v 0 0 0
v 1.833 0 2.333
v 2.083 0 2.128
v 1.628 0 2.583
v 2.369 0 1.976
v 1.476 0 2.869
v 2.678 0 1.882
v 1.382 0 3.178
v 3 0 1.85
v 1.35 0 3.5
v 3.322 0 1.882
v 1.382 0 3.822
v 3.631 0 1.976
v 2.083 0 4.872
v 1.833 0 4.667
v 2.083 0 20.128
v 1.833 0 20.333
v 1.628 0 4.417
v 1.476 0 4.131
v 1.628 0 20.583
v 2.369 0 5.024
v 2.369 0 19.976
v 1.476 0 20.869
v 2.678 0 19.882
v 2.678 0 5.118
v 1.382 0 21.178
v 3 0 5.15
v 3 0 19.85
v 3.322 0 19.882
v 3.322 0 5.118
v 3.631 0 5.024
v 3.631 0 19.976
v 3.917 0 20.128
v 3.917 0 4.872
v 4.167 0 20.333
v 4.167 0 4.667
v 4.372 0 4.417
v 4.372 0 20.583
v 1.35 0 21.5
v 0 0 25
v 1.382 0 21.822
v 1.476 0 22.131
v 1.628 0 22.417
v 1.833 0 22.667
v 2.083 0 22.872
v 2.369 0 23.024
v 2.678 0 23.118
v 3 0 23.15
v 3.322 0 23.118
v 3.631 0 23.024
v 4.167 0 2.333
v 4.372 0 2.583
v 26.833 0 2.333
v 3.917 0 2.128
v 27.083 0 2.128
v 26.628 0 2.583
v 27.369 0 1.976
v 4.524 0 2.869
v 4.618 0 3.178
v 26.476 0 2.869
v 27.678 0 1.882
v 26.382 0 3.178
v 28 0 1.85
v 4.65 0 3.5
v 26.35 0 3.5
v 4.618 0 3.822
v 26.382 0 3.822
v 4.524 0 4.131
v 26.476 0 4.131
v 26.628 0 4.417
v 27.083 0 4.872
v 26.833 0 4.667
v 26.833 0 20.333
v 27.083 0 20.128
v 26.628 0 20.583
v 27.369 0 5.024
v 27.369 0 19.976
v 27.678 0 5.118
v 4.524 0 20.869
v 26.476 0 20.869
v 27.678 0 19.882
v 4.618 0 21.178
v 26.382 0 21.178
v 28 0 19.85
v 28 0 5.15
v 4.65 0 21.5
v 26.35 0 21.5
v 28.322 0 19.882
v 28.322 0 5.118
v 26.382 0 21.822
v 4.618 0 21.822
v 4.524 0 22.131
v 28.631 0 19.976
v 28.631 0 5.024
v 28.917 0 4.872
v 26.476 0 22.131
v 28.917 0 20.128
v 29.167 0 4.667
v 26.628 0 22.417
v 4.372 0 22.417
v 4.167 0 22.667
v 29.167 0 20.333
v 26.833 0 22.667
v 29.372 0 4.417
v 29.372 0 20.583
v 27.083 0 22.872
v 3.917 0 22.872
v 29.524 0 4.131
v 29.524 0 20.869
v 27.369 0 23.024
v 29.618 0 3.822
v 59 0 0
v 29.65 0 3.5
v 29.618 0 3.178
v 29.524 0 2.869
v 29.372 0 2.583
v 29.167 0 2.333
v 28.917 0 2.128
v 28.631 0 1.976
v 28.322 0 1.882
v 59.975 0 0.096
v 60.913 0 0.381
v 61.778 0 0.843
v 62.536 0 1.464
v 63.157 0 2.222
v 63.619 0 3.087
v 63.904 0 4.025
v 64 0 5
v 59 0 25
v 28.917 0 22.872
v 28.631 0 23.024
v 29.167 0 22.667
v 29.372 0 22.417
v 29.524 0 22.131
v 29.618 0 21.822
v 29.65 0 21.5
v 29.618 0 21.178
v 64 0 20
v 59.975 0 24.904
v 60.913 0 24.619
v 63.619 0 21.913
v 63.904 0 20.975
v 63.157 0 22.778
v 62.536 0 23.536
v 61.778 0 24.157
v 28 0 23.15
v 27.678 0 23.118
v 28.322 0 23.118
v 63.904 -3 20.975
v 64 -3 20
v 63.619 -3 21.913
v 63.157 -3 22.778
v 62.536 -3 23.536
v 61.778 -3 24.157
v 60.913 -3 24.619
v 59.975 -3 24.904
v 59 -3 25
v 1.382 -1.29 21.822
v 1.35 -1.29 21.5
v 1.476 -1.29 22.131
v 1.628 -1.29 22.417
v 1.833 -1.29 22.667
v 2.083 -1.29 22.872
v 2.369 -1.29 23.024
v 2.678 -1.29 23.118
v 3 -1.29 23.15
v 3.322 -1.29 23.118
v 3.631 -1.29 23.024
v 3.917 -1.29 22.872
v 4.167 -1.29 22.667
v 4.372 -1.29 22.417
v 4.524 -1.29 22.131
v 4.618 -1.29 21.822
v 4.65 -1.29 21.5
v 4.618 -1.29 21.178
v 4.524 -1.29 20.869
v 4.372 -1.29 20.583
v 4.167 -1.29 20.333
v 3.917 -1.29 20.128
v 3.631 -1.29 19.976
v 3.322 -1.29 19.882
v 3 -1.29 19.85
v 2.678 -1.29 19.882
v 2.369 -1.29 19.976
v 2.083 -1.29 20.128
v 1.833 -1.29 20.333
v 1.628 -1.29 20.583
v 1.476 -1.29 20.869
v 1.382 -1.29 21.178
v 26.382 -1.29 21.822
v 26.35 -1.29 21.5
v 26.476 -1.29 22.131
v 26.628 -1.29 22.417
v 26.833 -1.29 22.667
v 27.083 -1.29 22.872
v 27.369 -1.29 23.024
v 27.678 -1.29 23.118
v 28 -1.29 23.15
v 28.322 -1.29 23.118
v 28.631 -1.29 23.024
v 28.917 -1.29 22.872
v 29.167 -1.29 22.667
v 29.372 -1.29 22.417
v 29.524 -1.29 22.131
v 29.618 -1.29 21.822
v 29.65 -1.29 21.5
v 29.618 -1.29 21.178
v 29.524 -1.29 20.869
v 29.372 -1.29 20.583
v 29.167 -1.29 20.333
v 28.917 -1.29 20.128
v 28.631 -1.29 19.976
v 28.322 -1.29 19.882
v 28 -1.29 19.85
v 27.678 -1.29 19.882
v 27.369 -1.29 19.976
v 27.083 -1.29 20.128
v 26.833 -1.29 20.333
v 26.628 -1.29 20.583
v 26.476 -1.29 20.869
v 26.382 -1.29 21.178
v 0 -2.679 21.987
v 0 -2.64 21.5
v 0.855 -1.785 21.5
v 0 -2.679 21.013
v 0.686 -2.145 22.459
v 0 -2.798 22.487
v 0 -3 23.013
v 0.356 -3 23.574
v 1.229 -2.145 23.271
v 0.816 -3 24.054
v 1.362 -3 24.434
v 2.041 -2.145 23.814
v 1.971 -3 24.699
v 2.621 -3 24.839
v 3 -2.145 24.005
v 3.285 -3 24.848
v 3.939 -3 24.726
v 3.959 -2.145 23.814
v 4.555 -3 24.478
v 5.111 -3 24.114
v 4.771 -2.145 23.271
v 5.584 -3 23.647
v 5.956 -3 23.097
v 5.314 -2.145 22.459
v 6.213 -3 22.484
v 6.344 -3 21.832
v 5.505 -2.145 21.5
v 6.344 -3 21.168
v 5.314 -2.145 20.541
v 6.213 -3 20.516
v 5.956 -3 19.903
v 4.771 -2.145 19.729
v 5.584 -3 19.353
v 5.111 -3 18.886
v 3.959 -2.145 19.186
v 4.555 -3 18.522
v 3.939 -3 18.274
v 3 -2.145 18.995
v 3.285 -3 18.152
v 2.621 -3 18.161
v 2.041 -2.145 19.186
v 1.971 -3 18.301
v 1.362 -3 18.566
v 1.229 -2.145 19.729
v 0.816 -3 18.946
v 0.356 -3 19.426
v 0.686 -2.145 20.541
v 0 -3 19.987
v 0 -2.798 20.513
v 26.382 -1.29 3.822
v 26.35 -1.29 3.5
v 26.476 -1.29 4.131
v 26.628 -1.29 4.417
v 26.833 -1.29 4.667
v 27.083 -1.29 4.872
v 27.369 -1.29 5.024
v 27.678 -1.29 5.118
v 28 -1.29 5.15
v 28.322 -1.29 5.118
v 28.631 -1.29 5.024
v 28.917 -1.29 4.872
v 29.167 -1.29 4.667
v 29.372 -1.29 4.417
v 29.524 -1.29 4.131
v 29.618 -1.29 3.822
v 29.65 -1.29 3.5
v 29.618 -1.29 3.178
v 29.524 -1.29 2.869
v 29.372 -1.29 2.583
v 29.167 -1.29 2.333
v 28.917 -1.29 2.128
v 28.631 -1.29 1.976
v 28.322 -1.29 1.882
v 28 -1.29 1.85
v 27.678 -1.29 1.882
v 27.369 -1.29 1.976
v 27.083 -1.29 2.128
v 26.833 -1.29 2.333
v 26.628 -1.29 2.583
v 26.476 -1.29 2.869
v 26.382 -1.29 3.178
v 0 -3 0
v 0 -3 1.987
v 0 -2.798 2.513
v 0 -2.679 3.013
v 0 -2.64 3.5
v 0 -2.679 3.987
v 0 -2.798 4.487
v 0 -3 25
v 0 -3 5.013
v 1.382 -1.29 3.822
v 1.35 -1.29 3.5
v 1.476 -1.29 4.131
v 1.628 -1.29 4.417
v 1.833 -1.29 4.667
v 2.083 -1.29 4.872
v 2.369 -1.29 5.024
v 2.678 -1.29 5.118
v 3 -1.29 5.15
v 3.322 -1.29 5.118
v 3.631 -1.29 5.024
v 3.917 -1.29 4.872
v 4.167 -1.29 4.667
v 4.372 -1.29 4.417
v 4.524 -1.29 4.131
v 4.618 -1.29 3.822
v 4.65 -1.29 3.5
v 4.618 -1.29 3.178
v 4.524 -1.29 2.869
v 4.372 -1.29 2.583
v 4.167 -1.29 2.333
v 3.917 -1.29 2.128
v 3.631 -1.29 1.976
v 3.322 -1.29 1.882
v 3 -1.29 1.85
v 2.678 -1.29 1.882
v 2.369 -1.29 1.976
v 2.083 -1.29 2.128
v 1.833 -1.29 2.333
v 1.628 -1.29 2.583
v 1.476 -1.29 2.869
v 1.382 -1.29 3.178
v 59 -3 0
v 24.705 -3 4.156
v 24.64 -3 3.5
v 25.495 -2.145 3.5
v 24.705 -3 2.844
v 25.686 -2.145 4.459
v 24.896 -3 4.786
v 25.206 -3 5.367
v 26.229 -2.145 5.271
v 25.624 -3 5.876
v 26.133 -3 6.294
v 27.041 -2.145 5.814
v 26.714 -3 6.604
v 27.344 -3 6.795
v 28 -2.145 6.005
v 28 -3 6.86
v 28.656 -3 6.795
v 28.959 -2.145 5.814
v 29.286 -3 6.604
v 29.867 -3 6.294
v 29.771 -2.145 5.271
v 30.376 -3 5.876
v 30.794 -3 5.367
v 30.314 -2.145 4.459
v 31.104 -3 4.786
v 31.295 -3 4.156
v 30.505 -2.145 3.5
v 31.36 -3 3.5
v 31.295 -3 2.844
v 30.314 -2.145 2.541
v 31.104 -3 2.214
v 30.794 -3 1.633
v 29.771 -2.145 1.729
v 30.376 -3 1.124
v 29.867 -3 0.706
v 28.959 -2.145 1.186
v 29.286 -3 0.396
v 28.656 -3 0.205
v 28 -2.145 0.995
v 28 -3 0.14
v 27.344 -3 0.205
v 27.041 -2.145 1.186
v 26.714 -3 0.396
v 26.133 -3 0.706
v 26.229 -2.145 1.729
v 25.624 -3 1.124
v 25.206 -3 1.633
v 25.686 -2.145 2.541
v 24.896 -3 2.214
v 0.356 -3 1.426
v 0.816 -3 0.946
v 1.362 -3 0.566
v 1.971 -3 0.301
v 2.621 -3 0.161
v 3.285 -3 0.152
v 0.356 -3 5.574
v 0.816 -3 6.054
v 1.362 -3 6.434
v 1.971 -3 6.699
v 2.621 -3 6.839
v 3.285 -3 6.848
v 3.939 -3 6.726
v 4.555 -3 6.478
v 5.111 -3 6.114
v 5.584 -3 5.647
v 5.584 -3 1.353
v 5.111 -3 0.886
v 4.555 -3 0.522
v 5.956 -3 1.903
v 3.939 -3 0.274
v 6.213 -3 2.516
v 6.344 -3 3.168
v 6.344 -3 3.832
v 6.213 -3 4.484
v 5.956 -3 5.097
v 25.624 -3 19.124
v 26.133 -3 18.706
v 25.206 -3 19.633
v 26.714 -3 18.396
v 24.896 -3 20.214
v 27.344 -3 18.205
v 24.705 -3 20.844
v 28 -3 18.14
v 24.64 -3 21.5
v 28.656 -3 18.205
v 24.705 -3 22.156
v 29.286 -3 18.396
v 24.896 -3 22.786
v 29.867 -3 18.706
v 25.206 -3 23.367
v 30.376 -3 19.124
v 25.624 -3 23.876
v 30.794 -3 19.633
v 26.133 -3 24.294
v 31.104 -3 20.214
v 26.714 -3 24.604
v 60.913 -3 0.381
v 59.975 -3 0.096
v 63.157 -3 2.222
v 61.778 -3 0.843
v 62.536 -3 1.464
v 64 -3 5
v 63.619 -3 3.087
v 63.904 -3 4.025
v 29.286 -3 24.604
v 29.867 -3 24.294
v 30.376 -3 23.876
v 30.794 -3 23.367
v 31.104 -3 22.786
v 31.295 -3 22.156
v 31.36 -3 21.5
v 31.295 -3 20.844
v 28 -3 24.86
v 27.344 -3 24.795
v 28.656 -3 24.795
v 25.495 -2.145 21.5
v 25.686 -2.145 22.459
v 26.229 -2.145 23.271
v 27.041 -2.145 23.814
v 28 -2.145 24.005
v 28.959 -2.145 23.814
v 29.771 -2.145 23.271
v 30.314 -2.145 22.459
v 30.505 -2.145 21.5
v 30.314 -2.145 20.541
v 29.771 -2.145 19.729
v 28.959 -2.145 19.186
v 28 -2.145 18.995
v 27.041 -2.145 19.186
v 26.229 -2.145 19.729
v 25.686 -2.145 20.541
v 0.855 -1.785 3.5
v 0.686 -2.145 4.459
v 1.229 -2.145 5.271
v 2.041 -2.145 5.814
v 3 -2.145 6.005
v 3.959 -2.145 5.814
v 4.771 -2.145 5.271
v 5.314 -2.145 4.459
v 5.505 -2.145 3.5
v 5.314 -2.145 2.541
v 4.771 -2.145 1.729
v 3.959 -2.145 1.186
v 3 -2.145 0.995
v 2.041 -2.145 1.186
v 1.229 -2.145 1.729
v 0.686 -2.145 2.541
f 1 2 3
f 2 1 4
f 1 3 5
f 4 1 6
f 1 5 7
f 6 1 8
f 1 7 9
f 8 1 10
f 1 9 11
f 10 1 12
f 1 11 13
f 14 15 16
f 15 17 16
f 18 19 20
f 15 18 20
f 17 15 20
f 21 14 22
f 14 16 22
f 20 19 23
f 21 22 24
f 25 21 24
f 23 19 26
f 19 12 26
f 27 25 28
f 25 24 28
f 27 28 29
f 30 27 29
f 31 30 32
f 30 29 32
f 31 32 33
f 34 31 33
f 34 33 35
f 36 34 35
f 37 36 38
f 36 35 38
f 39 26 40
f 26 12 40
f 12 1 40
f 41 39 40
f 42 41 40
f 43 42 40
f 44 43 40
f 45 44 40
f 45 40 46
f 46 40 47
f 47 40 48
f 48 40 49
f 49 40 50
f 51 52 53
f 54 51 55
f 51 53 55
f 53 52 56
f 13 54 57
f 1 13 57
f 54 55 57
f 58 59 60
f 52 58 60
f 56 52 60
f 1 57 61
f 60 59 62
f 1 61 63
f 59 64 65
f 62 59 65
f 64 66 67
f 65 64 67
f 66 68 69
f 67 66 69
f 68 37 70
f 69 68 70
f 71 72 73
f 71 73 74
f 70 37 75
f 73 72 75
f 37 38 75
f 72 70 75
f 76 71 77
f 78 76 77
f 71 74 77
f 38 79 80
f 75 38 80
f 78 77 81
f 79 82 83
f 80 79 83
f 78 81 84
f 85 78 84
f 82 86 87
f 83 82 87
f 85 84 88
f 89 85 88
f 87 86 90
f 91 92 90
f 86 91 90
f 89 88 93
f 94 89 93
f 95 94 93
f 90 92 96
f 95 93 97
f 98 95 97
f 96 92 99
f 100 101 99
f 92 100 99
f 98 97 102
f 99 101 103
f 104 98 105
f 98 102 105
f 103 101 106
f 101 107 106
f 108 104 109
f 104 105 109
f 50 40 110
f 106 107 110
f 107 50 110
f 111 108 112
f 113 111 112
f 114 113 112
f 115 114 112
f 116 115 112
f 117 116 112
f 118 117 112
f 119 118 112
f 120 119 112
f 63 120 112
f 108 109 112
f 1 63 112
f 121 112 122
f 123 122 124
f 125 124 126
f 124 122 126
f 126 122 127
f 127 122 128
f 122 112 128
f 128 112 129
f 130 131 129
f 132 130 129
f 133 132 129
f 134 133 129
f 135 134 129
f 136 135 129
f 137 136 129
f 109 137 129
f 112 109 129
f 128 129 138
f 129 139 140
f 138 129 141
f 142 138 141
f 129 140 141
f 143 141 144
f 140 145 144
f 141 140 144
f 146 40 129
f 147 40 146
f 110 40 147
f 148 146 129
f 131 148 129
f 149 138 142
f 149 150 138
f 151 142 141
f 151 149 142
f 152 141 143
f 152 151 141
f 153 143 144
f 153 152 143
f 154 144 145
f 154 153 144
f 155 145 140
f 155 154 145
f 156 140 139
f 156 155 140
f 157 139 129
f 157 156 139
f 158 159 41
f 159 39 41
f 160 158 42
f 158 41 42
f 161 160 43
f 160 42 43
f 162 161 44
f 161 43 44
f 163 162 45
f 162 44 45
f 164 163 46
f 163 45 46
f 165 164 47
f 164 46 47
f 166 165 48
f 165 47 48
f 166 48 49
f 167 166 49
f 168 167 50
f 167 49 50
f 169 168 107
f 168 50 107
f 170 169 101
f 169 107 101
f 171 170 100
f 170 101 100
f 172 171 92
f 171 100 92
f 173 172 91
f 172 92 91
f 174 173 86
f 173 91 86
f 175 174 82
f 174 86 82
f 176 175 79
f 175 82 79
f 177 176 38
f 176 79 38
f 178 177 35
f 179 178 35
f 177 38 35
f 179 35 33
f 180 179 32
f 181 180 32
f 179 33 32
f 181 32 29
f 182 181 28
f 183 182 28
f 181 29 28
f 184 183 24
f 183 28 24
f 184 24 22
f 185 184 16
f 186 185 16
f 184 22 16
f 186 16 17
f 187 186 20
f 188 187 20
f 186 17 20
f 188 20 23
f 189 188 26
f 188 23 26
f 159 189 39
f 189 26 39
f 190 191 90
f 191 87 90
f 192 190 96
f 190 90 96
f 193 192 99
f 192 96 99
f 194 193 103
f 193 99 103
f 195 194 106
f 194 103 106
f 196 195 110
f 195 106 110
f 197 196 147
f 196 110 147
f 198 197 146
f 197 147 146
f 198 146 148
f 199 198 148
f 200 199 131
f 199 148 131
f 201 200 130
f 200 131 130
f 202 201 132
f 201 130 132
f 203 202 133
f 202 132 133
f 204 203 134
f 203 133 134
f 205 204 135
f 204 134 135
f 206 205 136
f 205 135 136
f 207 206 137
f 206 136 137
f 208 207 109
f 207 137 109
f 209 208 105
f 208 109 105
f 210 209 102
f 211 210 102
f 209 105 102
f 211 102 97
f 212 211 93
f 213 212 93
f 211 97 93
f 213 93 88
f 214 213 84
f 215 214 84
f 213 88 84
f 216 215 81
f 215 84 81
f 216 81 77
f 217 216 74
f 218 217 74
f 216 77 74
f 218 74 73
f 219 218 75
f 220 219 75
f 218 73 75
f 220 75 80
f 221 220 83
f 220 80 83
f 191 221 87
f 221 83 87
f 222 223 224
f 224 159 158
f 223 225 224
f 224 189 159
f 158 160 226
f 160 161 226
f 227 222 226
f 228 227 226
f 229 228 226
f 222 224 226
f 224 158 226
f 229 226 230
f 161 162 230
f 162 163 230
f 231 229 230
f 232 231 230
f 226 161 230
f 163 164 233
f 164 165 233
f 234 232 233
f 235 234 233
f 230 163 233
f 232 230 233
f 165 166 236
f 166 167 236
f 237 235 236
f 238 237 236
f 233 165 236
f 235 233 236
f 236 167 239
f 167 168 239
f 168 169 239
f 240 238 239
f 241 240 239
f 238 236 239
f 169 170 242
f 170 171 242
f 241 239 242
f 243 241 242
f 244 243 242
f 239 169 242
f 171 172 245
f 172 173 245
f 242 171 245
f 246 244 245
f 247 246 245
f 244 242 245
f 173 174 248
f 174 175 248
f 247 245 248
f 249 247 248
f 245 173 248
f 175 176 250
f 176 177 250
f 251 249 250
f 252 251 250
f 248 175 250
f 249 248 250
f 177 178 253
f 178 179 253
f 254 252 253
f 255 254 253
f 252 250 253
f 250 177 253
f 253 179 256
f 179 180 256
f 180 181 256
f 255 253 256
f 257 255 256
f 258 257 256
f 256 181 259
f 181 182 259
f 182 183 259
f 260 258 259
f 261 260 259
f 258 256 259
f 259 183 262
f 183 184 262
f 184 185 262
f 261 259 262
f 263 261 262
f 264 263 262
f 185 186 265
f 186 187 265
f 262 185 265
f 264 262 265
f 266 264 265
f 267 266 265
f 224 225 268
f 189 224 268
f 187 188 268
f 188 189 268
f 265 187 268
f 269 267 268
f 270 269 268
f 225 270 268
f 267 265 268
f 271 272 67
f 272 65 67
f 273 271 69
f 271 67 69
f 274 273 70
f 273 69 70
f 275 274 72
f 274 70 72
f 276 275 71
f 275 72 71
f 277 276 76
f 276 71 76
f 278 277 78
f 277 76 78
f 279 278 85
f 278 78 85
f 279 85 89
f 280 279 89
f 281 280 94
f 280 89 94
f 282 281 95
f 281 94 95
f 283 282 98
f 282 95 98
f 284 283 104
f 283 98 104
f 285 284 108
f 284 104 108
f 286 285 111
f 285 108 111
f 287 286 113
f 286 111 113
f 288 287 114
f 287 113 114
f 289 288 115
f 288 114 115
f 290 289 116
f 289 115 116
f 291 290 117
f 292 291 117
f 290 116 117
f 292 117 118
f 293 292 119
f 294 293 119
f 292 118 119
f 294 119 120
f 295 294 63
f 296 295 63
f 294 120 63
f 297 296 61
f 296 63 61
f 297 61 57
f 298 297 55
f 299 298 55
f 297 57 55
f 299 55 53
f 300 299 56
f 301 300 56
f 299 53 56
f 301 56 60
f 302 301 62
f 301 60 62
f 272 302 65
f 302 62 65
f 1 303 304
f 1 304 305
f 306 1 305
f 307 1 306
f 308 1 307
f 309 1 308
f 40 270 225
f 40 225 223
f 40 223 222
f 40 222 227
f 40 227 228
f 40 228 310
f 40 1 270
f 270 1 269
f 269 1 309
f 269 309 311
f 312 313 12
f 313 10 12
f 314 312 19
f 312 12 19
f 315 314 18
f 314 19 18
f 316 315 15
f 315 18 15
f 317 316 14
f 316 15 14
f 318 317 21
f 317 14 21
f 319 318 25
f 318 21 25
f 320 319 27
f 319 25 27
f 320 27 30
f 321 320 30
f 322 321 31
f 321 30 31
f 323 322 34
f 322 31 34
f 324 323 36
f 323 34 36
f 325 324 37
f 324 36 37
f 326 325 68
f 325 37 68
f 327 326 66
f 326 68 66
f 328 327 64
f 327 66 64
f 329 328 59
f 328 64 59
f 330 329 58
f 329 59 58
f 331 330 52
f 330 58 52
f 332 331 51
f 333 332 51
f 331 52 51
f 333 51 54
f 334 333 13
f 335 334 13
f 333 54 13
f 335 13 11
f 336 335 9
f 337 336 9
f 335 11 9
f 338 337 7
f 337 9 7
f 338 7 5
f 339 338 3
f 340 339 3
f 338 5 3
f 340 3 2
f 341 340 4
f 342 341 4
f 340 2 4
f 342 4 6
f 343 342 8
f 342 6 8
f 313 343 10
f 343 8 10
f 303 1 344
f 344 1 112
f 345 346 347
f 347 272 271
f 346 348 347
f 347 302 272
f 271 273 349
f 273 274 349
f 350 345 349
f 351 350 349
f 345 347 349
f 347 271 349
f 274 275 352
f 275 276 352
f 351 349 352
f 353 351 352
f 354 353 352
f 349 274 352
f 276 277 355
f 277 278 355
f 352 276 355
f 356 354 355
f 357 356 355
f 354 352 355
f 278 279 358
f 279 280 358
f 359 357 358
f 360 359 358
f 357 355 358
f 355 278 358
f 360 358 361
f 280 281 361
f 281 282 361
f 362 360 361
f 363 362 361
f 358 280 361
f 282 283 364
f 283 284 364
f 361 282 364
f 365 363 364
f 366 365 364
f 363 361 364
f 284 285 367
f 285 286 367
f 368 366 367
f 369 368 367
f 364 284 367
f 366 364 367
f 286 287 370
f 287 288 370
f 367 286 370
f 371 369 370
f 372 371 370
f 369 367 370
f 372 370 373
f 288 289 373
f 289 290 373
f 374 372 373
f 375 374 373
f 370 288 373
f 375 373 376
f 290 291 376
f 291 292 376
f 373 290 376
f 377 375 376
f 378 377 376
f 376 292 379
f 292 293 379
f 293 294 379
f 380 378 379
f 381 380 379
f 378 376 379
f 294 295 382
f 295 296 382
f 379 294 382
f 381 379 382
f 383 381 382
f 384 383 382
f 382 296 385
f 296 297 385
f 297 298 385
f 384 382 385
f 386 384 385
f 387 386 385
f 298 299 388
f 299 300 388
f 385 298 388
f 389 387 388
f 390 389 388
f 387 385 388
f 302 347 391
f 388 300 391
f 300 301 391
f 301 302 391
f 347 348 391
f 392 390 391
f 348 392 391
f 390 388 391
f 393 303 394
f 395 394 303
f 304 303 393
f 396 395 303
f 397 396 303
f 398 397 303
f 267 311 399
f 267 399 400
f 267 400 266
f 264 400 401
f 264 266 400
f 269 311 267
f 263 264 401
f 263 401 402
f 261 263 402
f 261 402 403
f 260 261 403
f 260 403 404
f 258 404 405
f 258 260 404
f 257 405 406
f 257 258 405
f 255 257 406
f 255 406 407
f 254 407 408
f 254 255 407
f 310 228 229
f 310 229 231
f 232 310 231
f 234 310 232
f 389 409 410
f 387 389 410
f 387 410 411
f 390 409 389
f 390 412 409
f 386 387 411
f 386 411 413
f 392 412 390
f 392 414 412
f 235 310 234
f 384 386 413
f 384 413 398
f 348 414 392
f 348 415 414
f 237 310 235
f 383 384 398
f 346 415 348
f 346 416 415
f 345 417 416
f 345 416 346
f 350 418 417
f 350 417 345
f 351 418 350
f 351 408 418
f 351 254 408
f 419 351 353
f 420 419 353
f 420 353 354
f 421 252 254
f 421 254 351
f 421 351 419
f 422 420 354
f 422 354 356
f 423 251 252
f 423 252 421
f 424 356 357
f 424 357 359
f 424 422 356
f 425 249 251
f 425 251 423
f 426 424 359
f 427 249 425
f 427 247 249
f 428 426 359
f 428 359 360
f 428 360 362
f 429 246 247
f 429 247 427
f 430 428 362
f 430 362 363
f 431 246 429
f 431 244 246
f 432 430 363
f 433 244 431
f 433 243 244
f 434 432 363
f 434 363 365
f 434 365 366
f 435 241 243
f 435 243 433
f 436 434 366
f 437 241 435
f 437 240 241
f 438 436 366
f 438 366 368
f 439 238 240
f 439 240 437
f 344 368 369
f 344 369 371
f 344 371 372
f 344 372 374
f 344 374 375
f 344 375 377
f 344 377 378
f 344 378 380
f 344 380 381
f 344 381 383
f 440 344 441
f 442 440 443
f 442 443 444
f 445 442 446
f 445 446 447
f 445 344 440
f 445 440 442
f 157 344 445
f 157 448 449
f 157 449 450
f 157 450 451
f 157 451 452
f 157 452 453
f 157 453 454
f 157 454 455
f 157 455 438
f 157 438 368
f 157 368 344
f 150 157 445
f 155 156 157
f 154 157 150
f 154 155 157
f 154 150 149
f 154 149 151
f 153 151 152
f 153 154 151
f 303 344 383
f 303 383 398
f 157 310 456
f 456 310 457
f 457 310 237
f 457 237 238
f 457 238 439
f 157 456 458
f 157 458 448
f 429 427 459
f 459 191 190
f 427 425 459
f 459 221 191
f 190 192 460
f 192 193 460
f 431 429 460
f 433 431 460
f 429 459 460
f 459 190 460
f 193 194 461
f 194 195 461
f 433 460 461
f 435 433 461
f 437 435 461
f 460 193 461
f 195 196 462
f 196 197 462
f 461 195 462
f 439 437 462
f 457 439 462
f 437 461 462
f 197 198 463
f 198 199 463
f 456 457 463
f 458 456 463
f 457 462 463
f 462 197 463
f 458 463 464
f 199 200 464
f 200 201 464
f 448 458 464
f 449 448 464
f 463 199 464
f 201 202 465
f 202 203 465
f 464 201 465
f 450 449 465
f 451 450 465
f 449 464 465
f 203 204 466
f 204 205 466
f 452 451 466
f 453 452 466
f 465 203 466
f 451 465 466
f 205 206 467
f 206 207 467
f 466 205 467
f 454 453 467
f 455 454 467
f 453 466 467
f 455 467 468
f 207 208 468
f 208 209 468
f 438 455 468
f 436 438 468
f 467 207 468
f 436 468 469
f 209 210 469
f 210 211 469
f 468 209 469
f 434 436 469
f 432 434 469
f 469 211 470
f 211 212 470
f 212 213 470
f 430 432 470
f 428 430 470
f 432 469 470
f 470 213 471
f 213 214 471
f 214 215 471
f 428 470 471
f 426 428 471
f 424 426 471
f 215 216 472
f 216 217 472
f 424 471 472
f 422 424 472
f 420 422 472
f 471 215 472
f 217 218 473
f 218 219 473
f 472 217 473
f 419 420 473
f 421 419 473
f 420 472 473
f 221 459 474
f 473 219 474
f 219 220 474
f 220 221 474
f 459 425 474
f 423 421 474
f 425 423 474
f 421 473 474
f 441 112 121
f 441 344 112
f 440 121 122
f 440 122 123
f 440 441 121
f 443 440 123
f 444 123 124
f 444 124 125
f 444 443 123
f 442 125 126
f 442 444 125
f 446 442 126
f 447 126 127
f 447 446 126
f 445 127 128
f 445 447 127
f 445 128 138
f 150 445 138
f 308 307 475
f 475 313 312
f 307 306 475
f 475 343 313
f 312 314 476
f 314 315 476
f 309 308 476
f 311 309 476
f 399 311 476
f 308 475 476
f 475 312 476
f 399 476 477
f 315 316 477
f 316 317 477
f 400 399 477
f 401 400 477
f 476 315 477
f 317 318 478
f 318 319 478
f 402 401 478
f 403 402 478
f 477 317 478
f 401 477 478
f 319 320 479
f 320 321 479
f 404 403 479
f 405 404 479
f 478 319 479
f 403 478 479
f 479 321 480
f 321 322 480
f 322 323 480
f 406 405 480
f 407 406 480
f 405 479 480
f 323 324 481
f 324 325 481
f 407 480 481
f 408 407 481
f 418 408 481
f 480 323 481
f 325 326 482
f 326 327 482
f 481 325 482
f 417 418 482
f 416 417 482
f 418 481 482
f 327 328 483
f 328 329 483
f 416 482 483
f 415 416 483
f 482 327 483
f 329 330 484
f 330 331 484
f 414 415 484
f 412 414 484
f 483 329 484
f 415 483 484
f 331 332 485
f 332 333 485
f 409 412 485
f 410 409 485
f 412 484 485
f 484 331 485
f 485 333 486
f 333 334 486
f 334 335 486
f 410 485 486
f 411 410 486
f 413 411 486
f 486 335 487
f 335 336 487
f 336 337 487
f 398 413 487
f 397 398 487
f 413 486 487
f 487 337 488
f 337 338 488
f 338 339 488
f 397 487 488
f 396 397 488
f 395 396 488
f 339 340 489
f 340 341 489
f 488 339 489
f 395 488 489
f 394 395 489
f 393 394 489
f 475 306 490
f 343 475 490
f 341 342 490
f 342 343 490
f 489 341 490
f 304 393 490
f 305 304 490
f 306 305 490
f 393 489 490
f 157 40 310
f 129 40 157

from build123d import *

# Parameters (mm, degrees)
F0_W           = 64
F0_H           = 25
F1_DEPTH       = 3
F3_D           = 3.3
F3_CSINK_D     = 6.72
F3_CSINK_ANGLE = 90
F4_R           = 5


with BuildPart() as f1:
    # F0 (on Front) → F1 (new body)
    with BuildSketch(Plane.XZ):
        with Locations((32, 12.5)):
            Rectangle(F0_W, F0_H)
    extrude(amount=F1_DEPTH)

    # F3 (through all)
    with Locations(Plane.XZ.offset(3)):
        with Locations((3, 21.5), (28, 21.5), (28, 3.5), (3, 3.5)):
            CounterSinkHole(F3_D / 2, F3_CSINK_D / 2, counter_sink_angle=F3_CSINK_ANGLE)

    # F4
    f4_edges = [f1.edges().sort_by_distance(p)[0] for p in [
        (64, -1.5, 0),
        (64, -1.5, 25),
    ]]
    fillet(f4_edges, radius=F4_R)


solid = f1.part
